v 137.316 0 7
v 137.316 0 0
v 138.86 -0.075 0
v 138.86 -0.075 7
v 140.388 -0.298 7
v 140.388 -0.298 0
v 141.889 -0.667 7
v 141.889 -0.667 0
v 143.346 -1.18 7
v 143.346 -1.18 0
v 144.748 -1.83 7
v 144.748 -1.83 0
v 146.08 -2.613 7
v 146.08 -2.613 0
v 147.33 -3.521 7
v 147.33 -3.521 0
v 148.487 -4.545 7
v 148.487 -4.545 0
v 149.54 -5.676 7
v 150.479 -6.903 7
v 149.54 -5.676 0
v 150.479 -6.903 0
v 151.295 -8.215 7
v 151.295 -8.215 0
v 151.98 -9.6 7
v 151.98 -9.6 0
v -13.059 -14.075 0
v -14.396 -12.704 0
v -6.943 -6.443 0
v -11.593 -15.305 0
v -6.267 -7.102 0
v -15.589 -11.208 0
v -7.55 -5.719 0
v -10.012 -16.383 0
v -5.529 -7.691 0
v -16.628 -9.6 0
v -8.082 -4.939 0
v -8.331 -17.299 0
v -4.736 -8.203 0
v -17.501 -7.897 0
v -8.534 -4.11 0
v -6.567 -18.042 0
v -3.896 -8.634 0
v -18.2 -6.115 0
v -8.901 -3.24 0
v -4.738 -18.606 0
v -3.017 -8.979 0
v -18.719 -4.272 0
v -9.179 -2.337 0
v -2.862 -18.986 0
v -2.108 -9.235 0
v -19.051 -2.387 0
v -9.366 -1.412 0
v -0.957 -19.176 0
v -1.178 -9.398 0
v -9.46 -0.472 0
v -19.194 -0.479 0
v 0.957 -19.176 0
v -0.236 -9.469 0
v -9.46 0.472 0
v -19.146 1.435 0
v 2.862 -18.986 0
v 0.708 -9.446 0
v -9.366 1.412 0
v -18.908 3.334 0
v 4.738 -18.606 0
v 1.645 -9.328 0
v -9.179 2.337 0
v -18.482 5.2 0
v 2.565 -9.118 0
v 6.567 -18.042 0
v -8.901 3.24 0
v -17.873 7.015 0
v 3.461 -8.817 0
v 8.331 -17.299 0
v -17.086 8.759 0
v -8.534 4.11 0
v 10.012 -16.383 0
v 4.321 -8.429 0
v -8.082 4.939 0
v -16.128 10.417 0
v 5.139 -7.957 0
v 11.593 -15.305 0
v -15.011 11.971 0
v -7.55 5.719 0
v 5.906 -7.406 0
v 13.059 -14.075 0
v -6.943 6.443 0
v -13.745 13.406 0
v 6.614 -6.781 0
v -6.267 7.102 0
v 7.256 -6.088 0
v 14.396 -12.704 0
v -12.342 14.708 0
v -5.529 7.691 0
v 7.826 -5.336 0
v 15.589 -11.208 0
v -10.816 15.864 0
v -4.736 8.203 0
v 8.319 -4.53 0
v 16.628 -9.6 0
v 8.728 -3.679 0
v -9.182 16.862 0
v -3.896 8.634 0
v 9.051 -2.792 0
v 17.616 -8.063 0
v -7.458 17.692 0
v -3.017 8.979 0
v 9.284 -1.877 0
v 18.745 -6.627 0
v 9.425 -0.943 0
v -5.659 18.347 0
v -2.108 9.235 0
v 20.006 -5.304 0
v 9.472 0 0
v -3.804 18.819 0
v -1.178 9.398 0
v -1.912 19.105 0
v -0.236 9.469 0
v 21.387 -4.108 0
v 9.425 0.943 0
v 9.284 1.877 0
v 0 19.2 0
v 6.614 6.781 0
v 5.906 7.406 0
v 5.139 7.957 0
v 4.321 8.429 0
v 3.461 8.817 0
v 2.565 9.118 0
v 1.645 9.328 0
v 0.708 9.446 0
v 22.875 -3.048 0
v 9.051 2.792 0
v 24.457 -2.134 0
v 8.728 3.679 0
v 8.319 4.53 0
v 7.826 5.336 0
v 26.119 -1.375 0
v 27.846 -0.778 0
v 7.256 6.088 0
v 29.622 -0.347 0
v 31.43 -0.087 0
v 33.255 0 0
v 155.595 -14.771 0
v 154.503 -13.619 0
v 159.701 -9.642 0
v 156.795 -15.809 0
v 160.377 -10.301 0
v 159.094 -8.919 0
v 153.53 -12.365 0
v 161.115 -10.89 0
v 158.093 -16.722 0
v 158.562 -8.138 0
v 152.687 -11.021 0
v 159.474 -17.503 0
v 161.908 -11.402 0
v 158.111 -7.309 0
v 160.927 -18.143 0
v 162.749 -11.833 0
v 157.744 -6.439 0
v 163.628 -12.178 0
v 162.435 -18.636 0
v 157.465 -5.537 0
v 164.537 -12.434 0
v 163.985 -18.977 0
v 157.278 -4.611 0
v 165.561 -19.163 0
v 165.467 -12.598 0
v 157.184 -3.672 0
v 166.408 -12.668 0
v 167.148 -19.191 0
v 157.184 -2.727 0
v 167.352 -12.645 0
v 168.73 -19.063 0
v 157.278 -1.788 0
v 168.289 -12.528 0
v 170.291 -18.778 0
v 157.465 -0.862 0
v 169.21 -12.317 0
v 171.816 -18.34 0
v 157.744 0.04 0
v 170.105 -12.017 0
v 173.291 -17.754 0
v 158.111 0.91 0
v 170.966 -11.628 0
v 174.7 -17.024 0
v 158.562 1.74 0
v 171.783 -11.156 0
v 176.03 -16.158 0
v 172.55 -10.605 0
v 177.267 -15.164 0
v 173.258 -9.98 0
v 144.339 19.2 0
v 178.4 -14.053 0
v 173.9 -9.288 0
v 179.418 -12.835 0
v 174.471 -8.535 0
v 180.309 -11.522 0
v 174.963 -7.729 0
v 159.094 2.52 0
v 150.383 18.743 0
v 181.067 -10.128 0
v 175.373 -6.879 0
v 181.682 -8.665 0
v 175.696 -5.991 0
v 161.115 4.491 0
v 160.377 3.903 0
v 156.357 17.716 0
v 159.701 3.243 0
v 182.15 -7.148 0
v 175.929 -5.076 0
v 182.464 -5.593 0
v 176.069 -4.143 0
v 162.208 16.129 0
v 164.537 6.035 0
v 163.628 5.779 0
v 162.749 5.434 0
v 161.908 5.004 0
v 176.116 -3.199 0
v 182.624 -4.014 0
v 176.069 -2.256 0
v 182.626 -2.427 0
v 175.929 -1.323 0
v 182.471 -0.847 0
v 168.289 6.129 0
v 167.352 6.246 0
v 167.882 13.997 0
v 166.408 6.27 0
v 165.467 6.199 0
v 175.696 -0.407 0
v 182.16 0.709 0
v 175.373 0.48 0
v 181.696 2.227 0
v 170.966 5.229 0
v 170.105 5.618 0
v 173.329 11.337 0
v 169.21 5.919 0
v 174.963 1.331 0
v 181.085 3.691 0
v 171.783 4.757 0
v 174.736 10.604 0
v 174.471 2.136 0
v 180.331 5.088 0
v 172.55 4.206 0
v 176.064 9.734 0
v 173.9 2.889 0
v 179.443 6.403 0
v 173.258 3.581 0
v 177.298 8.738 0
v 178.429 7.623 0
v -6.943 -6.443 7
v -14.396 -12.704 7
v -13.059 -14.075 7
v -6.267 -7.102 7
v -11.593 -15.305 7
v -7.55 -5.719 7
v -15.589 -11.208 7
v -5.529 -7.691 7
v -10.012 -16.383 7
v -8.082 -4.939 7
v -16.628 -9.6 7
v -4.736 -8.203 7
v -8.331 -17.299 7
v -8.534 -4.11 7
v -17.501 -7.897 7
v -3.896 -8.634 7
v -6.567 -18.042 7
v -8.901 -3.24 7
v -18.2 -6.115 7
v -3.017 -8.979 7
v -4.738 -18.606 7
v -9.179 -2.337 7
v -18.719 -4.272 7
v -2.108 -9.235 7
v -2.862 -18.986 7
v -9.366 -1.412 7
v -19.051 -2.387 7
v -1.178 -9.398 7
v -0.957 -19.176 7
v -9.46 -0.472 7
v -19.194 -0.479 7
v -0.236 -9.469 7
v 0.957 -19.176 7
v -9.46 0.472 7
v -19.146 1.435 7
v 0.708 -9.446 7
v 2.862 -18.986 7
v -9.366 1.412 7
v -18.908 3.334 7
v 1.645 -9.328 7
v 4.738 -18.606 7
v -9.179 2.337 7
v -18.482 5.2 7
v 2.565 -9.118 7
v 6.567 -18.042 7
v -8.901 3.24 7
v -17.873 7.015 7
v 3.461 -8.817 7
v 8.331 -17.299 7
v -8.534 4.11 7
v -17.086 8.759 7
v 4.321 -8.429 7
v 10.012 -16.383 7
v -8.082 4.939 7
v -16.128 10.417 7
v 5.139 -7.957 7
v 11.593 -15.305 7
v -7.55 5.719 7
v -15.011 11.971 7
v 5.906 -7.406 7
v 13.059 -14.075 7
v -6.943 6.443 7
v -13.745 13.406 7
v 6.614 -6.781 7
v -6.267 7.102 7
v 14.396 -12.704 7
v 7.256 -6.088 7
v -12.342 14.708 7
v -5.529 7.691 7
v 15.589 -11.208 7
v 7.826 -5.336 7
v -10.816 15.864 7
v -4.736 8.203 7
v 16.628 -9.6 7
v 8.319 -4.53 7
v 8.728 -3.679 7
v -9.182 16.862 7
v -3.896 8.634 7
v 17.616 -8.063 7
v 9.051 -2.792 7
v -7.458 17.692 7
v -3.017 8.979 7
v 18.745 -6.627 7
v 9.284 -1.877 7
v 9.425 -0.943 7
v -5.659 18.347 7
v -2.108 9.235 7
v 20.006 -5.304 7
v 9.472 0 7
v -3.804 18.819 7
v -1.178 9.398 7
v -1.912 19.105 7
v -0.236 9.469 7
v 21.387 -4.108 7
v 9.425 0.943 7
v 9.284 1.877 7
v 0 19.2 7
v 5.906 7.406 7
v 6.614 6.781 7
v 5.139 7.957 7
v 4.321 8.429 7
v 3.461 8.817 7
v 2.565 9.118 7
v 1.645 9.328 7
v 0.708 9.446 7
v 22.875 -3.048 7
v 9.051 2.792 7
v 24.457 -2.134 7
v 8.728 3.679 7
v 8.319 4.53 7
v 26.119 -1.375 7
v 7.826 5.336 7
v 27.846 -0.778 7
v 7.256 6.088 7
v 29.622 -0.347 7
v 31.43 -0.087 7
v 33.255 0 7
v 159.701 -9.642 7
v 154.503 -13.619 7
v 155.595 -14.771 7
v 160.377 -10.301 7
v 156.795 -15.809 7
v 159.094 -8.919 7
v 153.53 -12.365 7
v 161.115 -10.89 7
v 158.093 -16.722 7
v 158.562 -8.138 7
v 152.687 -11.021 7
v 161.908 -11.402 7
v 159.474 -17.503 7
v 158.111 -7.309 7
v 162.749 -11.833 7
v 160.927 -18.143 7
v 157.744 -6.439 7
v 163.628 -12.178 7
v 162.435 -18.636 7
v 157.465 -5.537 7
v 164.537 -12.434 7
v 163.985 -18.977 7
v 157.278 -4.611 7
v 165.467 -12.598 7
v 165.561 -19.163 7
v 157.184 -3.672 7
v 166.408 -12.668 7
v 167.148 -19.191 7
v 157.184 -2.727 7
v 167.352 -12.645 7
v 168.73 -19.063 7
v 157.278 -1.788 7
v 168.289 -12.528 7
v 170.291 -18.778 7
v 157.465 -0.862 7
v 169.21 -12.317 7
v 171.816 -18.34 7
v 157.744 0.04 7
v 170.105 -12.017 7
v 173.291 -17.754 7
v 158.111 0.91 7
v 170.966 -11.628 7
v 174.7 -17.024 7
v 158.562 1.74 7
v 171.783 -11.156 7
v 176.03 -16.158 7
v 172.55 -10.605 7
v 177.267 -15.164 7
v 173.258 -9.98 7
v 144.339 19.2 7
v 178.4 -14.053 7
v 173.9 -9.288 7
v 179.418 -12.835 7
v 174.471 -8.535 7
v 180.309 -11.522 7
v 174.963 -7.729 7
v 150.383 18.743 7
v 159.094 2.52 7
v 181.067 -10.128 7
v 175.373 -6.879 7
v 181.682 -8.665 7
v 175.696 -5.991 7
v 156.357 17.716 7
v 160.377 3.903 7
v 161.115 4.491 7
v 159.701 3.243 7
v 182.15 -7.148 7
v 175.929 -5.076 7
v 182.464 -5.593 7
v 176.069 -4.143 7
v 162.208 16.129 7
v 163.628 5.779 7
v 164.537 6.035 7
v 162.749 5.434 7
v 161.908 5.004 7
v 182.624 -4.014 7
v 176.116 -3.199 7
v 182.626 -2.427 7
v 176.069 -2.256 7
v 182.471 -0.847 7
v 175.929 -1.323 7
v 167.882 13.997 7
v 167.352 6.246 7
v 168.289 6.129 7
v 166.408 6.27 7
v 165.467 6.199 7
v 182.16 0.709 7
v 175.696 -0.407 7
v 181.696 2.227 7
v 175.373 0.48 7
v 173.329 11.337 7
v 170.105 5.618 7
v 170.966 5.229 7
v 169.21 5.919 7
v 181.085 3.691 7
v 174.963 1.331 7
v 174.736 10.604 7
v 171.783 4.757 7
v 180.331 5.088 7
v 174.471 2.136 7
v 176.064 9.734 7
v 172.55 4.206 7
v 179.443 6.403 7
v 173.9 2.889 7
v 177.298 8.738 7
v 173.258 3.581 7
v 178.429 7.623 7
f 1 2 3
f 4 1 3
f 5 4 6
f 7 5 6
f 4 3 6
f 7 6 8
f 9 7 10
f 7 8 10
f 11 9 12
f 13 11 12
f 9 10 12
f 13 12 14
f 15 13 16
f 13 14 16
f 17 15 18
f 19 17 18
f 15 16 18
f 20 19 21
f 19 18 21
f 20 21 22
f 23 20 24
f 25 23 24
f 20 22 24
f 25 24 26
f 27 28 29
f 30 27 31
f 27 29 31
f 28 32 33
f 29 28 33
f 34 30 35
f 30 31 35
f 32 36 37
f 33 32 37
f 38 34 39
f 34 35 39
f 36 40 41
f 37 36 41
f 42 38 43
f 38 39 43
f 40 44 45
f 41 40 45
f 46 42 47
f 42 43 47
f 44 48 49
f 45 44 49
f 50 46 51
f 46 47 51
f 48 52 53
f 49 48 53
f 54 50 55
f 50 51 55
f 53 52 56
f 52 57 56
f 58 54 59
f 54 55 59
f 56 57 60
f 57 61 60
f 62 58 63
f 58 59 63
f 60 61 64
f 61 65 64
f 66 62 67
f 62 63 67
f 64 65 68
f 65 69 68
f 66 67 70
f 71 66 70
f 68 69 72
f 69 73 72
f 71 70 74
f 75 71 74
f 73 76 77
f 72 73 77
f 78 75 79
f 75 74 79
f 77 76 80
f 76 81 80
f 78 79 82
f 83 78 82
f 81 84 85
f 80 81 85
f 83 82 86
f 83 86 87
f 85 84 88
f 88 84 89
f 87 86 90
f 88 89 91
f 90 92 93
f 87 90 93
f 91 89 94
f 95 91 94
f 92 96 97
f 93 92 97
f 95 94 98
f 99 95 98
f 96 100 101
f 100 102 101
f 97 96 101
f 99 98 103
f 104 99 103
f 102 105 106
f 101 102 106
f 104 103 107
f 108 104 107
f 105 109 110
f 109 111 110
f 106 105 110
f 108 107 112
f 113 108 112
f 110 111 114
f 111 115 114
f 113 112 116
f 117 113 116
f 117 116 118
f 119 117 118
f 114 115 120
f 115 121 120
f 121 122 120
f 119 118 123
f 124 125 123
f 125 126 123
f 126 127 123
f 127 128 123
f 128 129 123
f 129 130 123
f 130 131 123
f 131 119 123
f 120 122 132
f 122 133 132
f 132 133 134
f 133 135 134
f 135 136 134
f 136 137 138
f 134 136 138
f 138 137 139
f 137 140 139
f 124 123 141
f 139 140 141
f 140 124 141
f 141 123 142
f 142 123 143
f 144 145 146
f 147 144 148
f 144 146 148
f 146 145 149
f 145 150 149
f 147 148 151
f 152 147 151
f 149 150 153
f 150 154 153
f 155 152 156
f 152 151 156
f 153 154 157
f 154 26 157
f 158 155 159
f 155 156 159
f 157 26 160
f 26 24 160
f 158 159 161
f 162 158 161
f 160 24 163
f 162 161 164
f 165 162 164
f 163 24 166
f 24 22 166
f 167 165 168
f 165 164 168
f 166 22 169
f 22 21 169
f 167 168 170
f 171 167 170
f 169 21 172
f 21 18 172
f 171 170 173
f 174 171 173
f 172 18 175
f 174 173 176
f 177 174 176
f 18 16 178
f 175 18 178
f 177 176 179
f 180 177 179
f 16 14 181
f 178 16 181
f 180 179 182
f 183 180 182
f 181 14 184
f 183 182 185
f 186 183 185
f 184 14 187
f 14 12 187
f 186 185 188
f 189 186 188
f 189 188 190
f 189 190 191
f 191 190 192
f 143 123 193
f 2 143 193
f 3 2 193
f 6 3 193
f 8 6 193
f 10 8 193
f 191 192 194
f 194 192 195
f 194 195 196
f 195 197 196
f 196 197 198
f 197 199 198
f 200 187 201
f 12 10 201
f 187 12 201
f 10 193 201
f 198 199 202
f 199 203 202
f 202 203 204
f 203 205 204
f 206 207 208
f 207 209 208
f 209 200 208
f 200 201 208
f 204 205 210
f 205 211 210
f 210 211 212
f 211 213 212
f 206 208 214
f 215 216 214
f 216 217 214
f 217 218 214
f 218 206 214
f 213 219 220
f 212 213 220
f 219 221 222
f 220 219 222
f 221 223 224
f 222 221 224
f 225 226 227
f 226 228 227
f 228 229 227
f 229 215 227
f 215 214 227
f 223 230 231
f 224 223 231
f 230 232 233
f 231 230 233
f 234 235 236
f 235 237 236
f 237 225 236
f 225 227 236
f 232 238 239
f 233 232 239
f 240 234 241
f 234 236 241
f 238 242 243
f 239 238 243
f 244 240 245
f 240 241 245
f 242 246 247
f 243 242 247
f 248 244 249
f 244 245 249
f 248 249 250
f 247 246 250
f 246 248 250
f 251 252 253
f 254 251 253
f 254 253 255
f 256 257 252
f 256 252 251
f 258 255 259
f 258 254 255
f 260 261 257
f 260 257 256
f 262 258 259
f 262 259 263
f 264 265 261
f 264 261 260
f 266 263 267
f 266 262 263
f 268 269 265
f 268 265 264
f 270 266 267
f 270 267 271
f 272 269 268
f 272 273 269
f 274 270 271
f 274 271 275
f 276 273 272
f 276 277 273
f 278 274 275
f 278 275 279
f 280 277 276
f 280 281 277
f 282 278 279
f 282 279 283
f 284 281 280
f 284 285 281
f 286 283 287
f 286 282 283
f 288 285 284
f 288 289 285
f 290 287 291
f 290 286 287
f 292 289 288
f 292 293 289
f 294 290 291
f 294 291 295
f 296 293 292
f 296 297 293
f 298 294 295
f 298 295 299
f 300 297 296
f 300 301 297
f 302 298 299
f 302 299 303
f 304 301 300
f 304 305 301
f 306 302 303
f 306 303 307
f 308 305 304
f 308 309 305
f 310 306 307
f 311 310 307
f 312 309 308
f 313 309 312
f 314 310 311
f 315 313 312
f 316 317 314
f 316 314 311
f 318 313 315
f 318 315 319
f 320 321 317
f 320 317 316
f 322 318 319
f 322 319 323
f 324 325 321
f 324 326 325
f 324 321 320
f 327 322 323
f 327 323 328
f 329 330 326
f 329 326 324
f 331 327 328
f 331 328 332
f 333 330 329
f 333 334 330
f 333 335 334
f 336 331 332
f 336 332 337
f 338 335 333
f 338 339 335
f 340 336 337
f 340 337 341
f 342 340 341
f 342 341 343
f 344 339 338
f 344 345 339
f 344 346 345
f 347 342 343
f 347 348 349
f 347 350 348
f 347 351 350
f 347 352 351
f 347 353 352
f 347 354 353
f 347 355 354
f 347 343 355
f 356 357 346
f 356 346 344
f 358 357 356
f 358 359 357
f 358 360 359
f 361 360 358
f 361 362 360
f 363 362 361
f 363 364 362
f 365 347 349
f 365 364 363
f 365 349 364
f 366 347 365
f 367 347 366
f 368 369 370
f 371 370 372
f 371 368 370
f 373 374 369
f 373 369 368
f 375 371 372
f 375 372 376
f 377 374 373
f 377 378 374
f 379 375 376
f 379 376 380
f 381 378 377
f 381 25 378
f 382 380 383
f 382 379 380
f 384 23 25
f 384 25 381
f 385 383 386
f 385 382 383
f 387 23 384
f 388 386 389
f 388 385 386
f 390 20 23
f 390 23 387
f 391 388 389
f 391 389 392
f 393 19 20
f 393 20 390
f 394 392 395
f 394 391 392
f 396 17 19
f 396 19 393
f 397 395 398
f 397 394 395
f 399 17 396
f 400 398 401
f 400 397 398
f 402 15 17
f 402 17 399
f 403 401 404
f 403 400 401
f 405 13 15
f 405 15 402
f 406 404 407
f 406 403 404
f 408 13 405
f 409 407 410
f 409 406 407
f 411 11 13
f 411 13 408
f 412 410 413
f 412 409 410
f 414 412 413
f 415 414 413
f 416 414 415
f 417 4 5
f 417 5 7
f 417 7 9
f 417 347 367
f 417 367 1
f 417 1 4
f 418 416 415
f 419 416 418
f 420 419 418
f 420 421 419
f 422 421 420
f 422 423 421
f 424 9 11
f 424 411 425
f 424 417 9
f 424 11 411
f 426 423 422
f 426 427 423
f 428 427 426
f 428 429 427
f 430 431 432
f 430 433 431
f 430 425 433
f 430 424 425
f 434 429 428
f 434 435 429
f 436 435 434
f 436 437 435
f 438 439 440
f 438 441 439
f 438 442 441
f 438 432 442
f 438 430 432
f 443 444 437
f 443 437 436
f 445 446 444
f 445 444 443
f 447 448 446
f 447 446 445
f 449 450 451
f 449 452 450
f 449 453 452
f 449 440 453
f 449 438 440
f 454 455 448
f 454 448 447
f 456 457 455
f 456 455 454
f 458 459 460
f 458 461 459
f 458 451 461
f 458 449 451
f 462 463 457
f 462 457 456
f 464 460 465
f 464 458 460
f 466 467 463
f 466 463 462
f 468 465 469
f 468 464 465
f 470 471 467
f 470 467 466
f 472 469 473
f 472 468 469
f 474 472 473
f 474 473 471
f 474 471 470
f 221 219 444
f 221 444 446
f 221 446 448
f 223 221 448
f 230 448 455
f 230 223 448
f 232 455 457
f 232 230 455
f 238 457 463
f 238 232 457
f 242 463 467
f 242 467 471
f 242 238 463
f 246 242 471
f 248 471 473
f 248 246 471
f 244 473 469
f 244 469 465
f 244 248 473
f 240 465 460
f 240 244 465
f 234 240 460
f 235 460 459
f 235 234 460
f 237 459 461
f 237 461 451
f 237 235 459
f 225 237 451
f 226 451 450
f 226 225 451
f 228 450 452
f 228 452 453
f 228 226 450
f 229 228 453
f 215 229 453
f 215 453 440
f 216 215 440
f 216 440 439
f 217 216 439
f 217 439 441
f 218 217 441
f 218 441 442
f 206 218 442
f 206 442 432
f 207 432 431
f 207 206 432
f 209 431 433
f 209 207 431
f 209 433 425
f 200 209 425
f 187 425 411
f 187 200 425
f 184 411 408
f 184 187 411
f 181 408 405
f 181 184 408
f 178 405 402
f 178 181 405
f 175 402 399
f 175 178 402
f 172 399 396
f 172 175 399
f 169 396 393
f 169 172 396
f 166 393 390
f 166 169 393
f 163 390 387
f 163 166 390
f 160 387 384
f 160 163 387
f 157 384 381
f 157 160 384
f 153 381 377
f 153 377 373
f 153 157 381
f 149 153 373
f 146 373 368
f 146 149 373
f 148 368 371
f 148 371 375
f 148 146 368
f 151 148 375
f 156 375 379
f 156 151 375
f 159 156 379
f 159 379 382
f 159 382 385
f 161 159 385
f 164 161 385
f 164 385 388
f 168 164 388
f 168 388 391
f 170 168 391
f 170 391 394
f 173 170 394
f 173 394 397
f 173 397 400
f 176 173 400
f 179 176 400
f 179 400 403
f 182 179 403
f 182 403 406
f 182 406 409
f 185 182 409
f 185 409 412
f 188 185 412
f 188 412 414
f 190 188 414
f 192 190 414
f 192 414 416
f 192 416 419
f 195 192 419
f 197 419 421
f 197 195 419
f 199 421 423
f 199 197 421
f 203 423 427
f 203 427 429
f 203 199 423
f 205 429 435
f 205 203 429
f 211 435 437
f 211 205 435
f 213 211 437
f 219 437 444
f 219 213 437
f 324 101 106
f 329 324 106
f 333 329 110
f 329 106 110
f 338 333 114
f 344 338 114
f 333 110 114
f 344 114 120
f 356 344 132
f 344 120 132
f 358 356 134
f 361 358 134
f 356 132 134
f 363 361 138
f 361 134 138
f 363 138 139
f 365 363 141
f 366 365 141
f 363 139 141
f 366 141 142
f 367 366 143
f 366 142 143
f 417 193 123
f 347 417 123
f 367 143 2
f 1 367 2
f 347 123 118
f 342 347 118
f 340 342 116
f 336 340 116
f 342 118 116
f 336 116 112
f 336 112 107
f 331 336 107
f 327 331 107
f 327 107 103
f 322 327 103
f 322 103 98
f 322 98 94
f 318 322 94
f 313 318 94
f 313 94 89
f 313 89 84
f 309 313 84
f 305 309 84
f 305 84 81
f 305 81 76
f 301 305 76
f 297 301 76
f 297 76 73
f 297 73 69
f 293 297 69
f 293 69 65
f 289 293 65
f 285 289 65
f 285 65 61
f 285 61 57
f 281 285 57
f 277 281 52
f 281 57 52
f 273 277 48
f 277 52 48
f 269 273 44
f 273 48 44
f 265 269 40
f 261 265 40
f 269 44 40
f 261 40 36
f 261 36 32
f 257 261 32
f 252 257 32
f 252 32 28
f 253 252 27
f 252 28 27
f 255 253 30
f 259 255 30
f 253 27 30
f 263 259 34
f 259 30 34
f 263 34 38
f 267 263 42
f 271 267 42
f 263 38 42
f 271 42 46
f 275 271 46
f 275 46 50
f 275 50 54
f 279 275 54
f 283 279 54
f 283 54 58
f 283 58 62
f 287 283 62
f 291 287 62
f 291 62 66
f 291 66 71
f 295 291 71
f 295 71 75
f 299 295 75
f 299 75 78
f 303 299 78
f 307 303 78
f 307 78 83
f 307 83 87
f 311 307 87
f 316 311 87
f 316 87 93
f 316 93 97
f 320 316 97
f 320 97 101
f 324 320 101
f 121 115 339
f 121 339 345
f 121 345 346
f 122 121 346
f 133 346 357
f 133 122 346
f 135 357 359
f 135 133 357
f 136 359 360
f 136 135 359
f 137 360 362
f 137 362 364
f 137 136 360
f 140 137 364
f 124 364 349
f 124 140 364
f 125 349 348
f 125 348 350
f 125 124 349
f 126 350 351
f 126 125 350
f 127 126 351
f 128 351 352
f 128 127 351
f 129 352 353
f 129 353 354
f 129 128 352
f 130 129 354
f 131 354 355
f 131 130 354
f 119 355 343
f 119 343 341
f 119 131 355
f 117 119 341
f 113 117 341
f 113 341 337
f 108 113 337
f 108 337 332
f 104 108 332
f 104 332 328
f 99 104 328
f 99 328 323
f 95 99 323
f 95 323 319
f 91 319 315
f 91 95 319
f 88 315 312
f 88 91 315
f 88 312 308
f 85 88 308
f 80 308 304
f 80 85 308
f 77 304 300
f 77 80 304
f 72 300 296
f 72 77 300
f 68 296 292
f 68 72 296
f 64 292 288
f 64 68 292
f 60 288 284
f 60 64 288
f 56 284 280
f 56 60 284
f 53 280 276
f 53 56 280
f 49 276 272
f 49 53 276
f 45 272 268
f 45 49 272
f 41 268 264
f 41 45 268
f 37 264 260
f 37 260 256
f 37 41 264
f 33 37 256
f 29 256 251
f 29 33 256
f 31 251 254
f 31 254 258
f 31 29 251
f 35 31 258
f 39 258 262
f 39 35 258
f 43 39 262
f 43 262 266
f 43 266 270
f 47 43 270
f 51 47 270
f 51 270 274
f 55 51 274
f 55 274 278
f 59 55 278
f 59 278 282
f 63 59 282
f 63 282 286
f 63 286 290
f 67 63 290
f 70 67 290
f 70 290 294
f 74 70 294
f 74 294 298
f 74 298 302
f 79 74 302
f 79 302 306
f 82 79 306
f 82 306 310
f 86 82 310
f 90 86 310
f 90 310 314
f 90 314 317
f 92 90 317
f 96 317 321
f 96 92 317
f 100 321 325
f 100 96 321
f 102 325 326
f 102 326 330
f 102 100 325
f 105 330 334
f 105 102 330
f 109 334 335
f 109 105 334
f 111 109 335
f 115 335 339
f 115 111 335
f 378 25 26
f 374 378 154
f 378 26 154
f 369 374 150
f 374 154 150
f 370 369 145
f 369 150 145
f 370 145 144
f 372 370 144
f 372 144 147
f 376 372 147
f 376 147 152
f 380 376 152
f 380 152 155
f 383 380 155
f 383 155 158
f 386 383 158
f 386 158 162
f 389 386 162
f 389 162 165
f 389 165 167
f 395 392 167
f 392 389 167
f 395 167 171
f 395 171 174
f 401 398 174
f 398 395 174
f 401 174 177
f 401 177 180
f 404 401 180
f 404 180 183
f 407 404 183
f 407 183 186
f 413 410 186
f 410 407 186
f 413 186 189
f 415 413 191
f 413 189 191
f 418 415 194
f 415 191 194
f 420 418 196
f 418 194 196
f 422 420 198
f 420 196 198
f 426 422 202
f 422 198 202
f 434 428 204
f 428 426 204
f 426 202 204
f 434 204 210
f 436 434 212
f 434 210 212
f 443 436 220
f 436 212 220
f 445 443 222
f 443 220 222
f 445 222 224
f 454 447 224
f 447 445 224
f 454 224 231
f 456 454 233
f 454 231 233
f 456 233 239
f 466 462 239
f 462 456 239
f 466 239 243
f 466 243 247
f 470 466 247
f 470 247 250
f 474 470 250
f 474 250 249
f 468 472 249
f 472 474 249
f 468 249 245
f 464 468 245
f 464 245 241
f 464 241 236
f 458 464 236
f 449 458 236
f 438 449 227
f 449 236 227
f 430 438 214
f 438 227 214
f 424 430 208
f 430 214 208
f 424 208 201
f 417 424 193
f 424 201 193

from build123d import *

# Parameters (mm, degrees)
SKETCH2_R           = 19.2
SKETCH2_R_2         = 9.472
SKETCH2_R_3         = 16
BOSS_EXTRUDE1_DEPTH = 7


with BuildPart() as part:
    # Sketch2 → Boss-Extrude1 (new body)
    # profile 1 of 3: a face of its own
    with BuildSketch(Plane.XY):
        with BuildLine():
            Line((144.339154619, 19.2), (0, 19.2))
            ThreePointArc((0, 19.2), (13.576450199, 13.576450199), (19.2, 0))
            ThreePointArc((19.2, 0), (18.545775865, -4.969325666), (16.627687753, -9.6))
            ThreePointArc((16.627687753, -9.6), (23.655375505, -2.572312247), (33.255375505, 0))
            Line((33.255375505, 0), (137.316262944, 0))
            ThreePointArc((137.316262944, 0), (146.079689306, -2.613351487), (151.980376503, -9.5997052))
            ThreePointArc((151.980376503, -9.5997052), (155.441326908, 8.223773716), (173.328738352, 11.337467698))
            ThreePointArc((173.328738352, 11.337467698), (159.301290335, 16.991856013), (144.339154619, 19.2))
        make_face()
    # profile 2 of 3: a face of its own
    with BuildSketch(Plane.XY):
        Circle(SKETCH2_R)
        Circle(SKETCH2_R_2, mode=Mode.SUBTRACT)
    # profile 3 of 3: a face of its own
    with BuildSketch(Plane.XY):
        with Locations((166.644490062, -3.199410399)):
            Circle(SKETCH2_R_3)
        with Locations((166.644490062, -3.199410399)):
            Circle(SKETCH2_R_2, mode=Mode.SUBTRACT)
    extrude(amount=BOSS_EXTRUDE1_DEPTH)


solid = part.part
